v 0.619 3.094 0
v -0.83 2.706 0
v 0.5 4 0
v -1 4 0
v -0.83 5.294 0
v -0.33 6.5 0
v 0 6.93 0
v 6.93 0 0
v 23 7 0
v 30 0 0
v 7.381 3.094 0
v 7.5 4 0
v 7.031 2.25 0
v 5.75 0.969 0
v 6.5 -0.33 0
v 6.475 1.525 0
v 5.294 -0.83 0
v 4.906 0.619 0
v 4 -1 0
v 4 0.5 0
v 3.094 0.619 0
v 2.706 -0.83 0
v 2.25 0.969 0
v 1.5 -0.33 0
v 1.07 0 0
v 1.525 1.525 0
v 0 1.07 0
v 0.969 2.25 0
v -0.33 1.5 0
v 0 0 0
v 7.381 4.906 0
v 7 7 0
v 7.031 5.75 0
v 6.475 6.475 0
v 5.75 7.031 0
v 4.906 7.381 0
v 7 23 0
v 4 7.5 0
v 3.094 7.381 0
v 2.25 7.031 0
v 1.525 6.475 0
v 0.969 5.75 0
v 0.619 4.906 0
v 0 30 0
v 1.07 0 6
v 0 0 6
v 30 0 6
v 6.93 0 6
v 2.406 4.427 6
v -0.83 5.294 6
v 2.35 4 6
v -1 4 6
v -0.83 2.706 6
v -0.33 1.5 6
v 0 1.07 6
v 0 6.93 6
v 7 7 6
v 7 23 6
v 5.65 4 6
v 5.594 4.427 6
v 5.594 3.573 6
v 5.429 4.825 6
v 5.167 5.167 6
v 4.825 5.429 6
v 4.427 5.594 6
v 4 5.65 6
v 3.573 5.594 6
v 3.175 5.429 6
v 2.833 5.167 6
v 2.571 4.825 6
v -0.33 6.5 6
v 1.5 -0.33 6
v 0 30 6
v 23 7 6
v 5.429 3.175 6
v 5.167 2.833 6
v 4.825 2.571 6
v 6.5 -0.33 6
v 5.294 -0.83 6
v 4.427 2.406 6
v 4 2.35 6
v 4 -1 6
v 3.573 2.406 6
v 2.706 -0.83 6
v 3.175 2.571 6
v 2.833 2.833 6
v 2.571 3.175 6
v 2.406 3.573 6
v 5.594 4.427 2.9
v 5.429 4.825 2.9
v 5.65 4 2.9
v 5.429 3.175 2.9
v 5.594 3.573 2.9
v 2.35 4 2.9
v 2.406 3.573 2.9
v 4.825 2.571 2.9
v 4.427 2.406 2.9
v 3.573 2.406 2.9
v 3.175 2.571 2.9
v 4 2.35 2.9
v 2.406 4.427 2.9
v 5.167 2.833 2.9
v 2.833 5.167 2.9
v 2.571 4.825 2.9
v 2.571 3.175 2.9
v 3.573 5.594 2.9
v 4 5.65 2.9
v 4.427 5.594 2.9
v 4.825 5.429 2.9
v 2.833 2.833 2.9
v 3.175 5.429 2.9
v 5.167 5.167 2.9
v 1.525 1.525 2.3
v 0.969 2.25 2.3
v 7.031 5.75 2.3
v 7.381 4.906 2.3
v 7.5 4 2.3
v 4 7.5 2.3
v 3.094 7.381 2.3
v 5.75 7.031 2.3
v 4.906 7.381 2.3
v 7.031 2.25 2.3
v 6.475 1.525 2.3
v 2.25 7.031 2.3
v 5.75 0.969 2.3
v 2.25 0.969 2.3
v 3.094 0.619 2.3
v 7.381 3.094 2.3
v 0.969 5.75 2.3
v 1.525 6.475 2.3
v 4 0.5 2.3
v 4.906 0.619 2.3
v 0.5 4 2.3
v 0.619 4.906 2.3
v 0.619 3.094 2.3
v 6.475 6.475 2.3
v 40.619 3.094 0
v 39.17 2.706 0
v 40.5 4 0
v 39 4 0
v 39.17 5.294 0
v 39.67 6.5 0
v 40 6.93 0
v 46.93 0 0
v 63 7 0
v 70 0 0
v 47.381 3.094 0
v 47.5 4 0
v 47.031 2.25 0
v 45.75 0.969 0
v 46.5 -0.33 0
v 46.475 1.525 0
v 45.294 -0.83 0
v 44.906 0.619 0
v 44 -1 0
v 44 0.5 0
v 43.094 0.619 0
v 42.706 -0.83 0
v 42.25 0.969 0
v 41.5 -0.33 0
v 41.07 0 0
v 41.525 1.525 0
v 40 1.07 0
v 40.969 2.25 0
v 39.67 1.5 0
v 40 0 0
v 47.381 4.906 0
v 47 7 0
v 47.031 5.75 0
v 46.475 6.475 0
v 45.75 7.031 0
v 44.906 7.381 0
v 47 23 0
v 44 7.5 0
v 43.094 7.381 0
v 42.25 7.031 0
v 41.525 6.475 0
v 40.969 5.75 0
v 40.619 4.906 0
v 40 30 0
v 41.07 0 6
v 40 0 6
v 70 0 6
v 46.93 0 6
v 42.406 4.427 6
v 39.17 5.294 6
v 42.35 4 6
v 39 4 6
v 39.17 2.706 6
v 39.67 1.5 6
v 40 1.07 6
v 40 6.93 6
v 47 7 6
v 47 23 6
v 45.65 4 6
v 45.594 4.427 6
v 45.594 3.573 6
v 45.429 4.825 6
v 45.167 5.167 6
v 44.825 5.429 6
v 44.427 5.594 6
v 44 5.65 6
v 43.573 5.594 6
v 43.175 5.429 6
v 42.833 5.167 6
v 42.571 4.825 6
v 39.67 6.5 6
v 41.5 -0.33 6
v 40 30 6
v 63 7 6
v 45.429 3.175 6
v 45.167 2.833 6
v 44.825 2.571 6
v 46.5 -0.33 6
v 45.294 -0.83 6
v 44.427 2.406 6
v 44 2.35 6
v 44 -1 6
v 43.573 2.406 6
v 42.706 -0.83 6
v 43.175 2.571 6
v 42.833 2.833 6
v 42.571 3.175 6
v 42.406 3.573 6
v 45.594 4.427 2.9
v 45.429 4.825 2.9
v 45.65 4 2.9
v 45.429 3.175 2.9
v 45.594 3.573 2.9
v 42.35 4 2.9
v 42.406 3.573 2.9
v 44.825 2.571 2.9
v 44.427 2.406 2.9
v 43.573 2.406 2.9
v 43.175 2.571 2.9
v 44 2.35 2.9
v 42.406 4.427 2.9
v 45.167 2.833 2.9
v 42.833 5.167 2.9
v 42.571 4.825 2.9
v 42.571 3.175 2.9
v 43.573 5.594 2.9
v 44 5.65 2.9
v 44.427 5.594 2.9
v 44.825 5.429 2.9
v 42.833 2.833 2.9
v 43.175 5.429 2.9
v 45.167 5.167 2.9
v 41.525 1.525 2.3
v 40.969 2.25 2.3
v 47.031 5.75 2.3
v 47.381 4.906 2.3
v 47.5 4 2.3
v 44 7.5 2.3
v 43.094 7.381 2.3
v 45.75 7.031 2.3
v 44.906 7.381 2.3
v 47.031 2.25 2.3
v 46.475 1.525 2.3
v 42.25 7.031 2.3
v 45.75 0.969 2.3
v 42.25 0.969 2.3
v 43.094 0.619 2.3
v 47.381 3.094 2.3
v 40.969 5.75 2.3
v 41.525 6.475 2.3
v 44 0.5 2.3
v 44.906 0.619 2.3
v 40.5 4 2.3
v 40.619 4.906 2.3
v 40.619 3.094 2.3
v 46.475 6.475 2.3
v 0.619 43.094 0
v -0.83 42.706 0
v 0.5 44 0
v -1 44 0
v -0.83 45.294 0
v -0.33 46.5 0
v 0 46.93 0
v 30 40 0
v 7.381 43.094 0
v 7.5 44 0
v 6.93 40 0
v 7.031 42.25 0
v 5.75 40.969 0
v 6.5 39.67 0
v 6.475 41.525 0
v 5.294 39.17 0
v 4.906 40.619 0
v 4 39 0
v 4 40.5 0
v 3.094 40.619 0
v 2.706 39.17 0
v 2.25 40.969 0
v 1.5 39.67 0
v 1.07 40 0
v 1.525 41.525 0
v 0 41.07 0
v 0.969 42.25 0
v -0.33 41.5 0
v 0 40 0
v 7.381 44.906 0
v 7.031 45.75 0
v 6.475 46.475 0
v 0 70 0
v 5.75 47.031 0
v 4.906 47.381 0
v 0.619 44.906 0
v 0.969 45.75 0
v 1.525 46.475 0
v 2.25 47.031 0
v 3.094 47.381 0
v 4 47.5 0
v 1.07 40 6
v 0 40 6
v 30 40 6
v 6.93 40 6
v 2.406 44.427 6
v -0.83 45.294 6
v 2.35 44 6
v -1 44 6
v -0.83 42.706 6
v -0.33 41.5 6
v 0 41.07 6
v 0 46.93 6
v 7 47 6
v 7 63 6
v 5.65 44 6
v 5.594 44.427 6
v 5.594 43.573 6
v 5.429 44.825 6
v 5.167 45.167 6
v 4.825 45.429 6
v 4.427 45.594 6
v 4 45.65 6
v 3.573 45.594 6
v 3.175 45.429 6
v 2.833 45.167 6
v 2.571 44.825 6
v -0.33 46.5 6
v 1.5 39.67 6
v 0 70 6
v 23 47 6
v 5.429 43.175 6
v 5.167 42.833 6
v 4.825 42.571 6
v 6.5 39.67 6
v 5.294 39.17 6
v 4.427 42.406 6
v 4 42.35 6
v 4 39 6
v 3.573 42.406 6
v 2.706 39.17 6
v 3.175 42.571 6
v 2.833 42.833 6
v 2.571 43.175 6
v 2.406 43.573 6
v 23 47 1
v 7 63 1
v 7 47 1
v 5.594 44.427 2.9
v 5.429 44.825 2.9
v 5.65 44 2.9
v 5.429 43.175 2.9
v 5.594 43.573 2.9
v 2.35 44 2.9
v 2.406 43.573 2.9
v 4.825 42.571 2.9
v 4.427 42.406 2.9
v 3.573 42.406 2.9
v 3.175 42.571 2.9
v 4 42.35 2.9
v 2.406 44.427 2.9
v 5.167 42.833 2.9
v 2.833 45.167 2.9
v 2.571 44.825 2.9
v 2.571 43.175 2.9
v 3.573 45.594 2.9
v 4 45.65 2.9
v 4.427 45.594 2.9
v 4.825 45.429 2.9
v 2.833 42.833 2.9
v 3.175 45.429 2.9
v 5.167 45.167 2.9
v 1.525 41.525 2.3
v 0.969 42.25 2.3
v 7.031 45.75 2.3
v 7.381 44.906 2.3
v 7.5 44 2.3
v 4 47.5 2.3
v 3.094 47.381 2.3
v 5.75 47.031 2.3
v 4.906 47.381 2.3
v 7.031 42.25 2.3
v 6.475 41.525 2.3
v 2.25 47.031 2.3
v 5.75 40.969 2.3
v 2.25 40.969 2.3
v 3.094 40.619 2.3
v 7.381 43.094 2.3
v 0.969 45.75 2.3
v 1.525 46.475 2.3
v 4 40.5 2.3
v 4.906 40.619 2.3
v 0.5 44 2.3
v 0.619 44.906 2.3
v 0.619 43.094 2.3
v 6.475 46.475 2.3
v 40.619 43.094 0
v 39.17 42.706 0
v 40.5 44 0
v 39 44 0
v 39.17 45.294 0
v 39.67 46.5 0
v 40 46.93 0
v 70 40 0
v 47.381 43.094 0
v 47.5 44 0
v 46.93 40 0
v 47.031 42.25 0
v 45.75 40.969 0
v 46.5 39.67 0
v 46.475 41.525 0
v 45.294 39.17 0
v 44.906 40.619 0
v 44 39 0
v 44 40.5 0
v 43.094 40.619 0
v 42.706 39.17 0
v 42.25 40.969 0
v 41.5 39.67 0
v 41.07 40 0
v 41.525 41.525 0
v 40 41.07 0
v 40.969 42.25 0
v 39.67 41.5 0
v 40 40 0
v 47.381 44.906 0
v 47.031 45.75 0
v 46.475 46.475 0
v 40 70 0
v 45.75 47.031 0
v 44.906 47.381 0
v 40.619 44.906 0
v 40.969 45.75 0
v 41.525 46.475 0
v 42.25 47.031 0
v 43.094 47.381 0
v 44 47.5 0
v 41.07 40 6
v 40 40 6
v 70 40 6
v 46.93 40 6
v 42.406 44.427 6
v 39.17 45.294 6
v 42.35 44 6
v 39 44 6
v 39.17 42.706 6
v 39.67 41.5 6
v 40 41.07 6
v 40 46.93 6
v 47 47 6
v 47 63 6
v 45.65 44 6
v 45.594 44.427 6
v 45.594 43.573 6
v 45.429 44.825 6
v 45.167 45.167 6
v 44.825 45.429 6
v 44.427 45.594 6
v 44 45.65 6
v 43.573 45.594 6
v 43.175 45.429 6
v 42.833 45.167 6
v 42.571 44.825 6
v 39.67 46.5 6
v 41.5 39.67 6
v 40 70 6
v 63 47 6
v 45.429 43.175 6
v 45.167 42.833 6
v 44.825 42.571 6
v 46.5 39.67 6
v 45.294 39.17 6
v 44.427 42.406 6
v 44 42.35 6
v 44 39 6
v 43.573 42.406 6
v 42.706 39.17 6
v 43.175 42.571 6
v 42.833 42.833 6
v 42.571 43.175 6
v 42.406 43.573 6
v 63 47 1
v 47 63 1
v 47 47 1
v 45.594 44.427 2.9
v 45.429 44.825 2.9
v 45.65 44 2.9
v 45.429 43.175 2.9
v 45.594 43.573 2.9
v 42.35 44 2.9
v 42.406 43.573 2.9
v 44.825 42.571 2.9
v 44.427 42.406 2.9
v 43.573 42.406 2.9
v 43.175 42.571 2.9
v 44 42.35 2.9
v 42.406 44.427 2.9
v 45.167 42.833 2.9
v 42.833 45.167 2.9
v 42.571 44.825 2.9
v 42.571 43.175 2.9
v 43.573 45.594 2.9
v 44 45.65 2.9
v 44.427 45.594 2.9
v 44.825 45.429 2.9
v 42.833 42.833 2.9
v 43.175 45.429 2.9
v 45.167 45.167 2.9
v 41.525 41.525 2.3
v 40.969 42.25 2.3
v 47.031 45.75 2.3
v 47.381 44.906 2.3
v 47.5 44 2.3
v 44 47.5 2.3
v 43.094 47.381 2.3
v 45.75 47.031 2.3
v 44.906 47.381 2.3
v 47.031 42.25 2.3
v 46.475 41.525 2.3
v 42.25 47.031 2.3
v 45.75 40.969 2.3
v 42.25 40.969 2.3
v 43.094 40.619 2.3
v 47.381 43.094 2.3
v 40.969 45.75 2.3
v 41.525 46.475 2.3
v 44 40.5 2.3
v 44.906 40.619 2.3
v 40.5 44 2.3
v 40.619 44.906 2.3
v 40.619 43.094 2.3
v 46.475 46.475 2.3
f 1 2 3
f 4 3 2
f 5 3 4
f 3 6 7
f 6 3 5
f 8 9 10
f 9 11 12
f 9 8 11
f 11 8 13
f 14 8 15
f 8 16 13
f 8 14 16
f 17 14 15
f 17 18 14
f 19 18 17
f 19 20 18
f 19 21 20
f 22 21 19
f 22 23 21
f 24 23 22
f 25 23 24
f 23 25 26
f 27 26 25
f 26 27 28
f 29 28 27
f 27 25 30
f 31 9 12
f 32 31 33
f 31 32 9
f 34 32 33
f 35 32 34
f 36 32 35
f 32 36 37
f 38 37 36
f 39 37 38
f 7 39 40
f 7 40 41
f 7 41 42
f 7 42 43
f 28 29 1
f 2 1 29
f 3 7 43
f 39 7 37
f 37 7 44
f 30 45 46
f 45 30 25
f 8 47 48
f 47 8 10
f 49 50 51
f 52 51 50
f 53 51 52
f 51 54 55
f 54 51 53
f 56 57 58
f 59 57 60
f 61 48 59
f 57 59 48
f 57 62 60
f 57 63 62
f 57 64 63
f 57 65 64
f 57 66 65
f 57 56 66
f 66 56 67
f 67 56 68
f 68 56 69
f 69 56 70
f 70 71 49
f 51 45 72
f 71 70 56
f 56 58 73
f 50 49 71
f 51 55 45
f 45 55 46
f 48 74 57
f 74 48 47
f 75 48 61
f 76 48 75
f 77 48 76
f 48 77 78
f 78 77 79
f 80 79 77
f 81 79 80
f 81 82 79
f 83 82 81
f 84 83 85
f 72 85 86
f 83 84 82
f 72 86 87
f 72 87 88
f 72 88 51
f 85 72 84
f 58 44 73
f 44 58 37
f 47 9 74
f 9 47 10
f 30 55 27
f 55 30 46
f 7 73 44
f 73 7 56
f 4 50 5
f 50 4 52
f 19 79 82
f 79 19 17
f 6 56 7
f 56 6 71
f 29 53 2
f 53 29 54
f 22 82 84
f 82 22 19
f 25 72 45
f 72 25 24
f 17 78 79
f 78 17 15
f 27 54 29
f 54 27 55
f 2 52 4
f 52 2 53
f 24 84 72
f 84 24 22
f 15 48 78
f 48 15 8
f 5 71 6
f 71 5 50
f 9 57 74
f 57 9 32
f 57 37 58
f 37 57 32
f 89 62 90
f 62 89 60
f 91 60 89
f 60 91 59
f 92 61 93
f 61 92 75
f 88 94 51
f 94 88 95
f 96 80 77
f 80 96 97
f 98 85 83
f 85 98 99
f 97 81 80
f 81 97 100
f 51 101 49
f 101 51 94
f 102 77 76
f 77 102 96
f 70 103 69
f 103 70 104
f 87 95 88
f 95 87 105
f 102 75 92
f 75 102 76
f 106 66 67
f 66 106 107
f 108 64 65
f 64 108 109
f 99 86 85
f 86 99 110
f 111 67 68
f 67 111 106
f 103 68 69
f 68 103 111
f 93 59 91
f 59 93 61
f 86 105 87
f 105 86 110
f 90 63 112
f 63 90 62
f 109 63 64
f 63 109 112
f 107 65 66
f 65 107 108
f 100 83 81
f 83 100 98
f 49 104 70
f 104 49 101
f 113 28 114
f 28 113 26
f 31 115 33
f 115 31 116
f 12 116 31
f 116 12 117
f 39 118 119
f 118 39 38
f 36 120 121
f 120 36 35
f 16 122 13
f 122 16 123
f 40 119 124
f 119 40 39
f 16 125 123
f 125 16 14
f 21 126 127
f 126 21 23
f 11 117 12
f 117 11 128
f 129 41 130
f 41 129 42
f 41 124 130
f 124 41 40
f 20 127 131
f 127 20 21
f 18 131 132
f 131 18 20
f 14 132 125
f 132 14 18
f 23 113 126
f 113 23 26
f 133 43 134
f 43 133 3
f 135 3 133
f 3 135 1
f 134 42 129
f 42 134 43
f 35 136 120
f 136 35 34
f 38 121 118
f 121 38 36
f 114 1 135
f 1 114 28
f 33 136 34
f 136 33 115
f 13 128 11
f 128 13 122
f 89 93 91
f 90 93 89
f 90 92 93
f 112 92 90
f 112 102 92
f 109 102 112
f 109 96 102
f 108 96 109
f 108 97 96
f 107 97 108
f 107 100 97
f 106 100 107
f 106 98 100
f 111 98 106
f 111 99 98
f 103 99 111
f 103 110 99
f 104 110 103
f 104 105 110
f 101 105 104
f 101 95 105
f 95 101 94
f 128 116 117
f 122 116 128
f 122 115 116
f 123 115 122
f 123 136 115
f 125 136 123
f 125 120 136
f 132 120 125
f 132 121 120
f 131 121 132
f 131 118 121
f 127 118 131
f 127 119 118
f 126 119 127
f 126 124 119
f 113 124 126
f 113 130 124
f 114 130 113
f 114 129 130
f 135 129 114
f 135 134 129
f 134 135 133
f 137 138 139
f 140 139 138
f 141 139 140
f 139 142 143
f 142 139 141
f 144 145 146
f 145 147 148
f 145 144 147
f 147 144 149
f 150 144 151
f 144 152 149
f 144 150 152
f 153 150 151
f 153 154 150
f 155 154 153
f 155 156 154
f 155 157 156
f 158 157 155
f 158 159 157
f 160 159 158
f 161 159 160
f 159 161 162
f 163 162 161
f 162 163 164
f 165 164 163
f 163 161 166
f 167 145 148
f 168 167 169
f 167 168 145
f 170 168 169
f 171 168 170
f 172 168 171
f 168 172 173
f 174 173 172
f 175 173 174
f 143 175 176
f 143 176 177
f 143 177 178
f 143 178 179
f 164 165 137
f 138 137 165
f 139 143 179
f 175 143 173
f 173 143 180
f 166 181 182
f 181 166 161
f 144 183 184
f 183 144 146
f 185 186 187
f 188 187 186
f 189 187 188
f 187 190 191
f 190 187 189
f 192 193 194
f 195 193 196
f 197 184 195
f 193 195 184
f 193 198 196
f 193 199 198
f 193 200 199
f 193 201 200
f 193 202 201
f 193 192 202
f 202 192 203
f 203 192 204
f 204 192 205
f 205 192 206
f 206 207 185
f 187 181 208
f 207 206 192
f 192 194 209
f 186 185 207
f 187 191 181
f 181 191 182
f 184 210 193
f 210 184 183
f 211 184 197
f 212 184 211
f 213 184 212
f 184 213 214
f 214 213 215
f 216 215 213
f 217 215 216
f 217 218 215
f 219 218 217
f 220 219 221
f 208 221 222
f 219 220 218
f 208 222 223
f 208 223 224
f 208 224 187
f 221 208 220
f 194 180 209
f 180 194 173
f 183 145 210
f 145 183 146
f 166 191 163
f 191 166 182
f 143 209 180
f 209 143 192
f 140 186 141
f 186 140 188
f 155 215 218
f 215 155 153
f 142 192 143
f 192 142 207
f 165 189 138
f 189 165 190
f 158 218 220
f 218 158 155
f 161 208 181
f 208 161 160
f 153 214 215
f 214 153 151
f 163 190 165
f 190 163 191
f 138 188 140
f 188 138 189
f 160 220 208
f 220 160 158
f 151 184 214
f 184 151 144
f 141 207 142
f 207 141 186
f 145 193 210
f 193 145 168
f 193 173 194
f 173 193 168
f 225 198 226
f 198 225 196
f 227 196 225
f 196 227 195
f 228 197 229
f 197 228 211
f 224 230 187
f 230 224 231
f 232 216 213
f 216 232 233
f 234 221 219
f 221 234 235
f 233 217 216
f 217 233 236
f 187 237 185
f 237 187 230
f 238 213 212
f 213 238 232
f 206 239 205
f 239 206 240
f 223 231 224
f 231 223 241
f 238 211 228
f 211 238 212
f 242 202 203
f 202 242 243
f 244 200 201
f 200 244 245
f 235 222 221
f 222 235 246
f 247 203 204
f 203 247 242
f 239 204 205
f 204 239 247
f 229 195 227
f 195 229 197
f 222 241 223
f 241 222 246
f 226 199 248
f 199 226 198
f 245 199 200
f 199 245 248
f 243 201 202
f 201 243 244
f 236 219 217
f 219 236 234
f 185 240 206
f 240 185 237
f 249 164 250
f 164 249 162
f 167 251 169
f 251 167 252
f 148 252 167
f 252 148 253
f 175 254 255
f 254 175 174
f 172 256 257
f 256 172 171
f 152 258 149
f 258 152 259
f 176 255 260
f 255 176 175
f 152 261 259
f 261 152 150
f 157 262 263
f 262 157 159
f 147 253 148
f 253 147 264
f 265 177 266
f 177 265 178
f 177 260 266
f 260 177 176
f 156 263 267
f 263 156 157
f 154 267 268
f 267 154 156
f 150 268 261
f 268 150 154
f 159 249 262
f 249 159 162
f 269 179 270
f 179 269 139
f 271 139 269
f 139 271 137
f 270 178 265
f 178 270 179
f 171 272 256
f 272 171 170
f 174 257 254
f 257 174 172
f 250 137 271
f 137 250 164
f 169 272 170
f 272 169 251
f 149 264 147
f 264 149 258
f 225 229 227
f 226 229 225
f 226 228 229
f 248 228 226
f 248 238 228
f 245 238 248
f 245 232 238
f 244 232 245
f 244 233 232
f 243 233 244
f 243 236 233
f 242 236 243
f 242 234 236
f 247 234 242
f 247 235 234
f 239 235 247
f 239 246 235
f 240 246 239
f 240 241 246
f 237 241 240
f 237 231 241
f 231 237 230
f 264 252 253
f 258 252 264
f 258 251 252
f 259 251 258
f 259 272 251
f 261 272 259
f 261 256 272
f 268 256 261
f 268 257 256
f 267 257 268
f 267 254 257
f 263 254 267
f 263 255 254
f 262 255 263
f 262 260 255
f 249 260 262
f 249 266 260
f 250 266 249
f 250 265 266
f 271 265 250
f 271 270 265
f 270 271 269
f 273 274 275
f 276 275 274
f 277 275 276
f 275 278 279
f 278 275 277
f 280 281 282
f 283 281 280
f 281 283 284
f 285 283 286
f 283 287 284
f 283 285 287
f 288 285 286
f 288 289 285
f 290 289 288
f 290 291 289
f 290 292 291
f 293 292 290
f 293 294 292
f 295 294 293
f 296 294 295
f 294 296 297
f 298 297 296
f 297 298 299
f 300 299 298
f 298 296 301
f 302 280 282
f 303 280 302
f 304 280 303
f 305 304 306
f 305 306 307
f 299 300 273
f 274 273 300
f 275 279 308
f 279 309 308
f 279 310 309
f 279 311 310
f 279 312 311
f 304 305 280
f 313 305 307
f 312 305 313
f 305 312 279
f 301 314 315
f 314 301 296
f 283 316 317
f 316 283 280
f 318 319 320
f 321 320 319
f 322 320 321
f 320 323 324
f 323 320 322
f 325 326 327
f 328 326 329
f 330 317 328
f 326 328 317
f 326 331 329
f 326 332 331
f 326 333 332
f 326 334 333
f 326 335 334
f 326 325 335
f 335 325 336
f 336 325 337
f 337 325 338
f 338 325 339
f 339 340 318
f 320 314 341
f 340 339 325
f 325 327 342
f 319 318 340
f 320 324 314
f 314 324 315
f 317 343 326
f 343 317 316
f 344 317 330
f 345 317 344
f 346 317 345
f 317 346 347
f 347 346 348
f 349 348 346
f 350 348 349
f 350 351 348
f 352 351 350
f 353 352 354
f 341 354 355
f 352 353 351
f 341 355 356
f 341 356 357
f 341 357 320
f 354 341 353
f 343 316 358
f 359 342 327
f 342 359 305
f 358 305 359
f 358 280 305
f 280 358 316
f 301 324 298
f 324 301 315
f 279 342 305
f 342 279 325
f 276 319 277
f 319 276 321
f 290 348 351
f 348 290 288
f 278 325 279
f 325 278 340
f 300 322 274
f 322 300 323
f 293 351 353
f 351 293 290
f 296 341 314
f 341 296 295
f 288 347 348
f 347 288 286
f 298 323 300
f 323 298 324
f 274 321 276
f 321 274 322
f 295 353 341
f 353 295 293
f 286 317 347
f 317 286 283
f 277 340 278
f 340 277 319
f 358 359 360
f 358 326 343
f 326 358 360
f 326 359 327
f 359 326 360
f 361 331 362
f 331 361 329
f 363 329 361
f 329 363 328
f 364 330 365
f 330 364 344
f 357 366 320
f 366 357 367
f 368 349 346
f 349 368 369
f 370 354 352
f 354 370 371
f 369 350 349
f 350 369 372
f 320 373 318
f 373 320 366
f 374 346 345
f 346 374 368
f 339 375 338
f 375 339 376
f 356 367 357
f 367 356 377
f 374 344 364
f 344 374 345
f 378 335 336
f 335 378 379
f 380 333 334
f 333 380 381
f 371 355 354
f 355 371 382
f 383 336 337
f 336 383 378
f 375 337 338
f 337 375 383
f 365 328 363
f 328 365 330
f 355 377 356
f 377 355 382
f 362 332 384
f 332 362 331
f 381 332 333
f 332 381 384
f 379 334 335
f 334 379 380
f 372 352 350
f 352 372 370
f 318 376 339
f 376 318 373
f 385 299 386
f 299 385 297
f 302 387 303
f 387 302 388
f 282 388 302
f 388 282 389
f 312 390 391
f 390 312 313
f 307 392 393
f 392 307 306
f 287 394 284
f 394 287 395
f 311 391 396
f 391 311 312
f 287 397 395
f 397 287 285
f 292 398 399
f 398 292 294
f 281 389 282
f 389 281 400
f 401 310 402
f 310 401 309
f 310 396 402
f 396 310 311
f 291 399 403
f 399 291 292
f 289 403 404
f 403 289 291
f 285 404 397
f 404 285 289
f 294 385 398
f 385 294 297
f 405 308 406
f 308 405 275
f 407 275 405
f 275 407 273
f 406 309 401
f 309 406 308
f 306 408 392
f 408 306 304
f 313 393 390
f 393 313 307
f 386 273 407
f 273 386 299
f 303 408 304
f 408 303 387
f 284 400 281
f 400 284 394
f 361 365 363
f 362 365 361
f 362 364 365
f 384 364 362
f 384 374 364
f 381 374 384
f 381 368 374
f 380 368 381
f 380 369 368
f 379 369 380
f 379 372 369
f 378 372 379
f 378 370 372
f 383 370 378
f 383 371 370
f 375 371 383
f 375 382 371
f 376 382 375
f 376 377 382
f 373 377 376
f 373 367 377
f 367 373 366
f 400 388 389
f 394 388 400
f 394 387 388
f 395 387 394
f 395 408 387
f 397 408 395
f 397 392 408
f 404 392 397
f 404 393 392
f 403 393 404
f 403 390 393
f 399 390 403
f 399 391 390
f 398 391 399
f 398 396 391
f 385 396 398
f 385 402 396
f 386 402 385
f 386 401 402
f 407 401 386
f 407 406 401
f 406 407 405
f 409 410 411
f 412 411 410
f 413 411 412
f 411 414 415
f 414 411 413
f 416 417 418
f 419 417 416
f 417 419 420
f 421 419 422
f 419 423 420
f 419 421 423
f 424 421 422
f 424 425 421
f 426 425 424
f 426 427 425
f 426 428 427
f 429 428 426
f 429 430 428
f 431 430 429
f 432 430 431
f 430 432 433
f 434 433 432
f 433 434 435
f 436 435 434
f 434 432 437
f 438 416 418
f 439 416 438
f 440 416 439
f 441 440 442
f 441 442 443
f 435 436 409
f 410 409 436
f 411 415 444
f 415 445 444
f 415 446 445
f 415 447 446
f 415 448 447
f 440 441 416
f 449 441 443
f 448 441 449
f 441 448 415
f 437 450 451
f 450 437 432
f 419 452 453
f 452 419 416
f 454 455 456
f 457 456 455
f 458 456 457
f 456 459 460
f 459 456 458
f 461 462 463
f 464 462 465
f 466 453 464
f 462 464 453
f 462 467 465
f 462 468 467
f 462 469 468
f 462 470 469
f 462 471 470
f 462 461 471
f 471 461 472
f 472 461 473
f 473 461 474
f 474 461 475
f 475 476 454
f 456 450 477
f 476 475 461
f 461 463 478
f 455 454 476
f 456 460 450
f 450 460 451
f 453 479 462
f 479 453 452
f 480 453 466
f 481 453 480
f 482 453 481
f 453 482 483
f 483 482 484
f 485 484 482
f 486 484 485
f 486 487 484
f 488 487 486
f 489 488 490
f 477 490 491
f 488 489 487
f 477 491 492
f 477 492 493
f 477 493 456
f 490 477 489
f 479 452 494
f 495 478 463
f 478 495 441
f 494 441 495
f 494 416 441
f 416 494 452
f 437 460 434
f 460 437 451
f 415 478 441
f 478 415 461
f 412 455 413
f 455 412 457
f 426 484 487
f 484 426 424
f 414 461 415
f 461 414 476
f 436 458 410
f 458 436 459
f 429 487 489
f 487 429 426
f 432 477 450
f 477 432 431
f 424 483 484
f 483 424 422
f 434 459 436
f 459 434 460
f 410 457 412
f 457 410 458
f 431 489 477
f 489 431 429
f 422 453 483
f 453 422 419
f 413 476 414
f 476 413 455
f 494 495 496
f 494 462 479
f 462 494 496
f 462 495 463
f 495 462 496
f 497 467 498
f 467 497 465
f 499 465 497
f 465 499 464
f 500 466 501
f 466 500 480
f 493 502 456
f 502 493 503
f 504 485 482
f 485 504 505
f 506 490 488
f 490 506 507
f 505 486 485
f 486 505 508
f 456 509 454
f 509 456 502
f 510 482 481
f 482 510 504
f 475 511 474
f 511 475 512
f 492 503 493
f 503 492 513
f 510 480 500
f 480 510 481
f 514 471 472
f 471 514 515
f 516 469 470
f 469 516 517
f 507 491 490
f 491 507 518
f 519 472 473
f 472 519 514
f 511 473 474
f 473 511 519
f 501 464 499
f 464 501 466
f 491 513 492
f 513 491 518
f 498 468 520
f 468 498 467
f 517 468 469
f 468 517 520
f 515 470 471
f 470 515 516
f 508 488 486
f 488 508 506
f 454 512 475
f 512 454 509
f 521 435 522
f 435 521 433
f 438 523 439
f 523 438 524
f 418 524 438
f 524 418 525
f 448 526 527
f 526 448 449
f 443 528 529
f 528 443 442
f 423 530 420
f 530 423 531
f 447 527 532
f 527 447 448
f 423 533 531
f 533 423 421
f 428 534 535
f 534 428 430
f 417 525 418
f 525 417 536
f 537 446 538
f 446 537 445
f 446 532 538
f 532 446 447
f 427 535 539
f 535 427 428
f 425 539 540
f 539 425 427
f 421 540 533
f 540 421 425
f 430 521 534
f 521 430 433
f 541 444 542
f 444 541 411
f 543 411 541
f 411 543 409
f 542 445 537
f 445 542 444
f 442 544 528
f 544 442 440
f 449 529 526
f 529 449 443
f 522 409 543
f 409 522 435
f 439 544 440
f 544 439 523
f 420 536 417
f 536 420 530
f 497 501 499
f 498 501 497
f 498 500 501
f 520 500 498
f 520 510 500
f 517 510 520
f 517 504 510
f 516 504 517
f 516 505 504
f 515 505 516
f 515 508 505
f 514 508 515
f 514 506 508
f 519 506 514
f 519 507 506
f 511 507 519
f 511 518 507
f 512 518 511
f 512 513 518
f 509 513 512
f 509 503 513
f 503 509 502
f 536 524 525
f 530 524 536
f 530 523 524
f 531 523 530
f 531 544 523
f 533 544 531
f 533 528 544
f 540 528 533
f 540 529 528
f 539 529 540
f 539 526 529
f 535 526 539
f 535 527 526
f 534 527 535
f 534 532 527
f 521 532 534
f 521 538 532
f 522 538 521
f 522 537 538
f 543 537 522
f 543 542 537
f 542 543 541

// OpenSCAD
/*
	Glass plate holder
	By Humberto Kelkboom
	Lark3D.nl
	
	Changed: Inserted adjustable side thikness.
	
	Changed: inserted glass height and lowerd screw
*/

//The width of the triange
WidthOffTriagle=30;
//The width of the Sides
WithOffSides = 7;
//height of the glassplate
height = 6;

module triangle(width,length,h)
{
	linear_extrude(height=h) 
	polygon([[0,0],[0,width],[length,0]]);
}

module PlateHolder(OOC){
union(){
difference(){
union(){
triangle(WidthOffTriagle,WidthOffTriagle,height);
translate([4,4,height/2])cylinder(r=5, h=height, center=true,$fn=24);
}
translate([WithOffSides,WithOffSides,(OOC=="open"?-0.5:1)])triangle(WidthOffTriagle,WidthOffTriagle,height+2);
translate([4,4,height/2])cylinder(r=1.65, h=height, center=true,$fn=24);
translate([4,4,1.2])cylinder(r=3.5, h=2.4, center=true,$fn=24);
}
translate([4,4,2.6])cylinder(r=4, h=0.6, center=true,$fn=24);
}
};

PlateHolder("open");

translate([WidthOffTriagle +10,0,0])PlateHolder("open");
translate([0,WidthOffTriagle +10,0])PlateHolder("close");
translate([WidthOffTriagle +10,WidthOffTriagle +10,0])PlateHolder("close");
